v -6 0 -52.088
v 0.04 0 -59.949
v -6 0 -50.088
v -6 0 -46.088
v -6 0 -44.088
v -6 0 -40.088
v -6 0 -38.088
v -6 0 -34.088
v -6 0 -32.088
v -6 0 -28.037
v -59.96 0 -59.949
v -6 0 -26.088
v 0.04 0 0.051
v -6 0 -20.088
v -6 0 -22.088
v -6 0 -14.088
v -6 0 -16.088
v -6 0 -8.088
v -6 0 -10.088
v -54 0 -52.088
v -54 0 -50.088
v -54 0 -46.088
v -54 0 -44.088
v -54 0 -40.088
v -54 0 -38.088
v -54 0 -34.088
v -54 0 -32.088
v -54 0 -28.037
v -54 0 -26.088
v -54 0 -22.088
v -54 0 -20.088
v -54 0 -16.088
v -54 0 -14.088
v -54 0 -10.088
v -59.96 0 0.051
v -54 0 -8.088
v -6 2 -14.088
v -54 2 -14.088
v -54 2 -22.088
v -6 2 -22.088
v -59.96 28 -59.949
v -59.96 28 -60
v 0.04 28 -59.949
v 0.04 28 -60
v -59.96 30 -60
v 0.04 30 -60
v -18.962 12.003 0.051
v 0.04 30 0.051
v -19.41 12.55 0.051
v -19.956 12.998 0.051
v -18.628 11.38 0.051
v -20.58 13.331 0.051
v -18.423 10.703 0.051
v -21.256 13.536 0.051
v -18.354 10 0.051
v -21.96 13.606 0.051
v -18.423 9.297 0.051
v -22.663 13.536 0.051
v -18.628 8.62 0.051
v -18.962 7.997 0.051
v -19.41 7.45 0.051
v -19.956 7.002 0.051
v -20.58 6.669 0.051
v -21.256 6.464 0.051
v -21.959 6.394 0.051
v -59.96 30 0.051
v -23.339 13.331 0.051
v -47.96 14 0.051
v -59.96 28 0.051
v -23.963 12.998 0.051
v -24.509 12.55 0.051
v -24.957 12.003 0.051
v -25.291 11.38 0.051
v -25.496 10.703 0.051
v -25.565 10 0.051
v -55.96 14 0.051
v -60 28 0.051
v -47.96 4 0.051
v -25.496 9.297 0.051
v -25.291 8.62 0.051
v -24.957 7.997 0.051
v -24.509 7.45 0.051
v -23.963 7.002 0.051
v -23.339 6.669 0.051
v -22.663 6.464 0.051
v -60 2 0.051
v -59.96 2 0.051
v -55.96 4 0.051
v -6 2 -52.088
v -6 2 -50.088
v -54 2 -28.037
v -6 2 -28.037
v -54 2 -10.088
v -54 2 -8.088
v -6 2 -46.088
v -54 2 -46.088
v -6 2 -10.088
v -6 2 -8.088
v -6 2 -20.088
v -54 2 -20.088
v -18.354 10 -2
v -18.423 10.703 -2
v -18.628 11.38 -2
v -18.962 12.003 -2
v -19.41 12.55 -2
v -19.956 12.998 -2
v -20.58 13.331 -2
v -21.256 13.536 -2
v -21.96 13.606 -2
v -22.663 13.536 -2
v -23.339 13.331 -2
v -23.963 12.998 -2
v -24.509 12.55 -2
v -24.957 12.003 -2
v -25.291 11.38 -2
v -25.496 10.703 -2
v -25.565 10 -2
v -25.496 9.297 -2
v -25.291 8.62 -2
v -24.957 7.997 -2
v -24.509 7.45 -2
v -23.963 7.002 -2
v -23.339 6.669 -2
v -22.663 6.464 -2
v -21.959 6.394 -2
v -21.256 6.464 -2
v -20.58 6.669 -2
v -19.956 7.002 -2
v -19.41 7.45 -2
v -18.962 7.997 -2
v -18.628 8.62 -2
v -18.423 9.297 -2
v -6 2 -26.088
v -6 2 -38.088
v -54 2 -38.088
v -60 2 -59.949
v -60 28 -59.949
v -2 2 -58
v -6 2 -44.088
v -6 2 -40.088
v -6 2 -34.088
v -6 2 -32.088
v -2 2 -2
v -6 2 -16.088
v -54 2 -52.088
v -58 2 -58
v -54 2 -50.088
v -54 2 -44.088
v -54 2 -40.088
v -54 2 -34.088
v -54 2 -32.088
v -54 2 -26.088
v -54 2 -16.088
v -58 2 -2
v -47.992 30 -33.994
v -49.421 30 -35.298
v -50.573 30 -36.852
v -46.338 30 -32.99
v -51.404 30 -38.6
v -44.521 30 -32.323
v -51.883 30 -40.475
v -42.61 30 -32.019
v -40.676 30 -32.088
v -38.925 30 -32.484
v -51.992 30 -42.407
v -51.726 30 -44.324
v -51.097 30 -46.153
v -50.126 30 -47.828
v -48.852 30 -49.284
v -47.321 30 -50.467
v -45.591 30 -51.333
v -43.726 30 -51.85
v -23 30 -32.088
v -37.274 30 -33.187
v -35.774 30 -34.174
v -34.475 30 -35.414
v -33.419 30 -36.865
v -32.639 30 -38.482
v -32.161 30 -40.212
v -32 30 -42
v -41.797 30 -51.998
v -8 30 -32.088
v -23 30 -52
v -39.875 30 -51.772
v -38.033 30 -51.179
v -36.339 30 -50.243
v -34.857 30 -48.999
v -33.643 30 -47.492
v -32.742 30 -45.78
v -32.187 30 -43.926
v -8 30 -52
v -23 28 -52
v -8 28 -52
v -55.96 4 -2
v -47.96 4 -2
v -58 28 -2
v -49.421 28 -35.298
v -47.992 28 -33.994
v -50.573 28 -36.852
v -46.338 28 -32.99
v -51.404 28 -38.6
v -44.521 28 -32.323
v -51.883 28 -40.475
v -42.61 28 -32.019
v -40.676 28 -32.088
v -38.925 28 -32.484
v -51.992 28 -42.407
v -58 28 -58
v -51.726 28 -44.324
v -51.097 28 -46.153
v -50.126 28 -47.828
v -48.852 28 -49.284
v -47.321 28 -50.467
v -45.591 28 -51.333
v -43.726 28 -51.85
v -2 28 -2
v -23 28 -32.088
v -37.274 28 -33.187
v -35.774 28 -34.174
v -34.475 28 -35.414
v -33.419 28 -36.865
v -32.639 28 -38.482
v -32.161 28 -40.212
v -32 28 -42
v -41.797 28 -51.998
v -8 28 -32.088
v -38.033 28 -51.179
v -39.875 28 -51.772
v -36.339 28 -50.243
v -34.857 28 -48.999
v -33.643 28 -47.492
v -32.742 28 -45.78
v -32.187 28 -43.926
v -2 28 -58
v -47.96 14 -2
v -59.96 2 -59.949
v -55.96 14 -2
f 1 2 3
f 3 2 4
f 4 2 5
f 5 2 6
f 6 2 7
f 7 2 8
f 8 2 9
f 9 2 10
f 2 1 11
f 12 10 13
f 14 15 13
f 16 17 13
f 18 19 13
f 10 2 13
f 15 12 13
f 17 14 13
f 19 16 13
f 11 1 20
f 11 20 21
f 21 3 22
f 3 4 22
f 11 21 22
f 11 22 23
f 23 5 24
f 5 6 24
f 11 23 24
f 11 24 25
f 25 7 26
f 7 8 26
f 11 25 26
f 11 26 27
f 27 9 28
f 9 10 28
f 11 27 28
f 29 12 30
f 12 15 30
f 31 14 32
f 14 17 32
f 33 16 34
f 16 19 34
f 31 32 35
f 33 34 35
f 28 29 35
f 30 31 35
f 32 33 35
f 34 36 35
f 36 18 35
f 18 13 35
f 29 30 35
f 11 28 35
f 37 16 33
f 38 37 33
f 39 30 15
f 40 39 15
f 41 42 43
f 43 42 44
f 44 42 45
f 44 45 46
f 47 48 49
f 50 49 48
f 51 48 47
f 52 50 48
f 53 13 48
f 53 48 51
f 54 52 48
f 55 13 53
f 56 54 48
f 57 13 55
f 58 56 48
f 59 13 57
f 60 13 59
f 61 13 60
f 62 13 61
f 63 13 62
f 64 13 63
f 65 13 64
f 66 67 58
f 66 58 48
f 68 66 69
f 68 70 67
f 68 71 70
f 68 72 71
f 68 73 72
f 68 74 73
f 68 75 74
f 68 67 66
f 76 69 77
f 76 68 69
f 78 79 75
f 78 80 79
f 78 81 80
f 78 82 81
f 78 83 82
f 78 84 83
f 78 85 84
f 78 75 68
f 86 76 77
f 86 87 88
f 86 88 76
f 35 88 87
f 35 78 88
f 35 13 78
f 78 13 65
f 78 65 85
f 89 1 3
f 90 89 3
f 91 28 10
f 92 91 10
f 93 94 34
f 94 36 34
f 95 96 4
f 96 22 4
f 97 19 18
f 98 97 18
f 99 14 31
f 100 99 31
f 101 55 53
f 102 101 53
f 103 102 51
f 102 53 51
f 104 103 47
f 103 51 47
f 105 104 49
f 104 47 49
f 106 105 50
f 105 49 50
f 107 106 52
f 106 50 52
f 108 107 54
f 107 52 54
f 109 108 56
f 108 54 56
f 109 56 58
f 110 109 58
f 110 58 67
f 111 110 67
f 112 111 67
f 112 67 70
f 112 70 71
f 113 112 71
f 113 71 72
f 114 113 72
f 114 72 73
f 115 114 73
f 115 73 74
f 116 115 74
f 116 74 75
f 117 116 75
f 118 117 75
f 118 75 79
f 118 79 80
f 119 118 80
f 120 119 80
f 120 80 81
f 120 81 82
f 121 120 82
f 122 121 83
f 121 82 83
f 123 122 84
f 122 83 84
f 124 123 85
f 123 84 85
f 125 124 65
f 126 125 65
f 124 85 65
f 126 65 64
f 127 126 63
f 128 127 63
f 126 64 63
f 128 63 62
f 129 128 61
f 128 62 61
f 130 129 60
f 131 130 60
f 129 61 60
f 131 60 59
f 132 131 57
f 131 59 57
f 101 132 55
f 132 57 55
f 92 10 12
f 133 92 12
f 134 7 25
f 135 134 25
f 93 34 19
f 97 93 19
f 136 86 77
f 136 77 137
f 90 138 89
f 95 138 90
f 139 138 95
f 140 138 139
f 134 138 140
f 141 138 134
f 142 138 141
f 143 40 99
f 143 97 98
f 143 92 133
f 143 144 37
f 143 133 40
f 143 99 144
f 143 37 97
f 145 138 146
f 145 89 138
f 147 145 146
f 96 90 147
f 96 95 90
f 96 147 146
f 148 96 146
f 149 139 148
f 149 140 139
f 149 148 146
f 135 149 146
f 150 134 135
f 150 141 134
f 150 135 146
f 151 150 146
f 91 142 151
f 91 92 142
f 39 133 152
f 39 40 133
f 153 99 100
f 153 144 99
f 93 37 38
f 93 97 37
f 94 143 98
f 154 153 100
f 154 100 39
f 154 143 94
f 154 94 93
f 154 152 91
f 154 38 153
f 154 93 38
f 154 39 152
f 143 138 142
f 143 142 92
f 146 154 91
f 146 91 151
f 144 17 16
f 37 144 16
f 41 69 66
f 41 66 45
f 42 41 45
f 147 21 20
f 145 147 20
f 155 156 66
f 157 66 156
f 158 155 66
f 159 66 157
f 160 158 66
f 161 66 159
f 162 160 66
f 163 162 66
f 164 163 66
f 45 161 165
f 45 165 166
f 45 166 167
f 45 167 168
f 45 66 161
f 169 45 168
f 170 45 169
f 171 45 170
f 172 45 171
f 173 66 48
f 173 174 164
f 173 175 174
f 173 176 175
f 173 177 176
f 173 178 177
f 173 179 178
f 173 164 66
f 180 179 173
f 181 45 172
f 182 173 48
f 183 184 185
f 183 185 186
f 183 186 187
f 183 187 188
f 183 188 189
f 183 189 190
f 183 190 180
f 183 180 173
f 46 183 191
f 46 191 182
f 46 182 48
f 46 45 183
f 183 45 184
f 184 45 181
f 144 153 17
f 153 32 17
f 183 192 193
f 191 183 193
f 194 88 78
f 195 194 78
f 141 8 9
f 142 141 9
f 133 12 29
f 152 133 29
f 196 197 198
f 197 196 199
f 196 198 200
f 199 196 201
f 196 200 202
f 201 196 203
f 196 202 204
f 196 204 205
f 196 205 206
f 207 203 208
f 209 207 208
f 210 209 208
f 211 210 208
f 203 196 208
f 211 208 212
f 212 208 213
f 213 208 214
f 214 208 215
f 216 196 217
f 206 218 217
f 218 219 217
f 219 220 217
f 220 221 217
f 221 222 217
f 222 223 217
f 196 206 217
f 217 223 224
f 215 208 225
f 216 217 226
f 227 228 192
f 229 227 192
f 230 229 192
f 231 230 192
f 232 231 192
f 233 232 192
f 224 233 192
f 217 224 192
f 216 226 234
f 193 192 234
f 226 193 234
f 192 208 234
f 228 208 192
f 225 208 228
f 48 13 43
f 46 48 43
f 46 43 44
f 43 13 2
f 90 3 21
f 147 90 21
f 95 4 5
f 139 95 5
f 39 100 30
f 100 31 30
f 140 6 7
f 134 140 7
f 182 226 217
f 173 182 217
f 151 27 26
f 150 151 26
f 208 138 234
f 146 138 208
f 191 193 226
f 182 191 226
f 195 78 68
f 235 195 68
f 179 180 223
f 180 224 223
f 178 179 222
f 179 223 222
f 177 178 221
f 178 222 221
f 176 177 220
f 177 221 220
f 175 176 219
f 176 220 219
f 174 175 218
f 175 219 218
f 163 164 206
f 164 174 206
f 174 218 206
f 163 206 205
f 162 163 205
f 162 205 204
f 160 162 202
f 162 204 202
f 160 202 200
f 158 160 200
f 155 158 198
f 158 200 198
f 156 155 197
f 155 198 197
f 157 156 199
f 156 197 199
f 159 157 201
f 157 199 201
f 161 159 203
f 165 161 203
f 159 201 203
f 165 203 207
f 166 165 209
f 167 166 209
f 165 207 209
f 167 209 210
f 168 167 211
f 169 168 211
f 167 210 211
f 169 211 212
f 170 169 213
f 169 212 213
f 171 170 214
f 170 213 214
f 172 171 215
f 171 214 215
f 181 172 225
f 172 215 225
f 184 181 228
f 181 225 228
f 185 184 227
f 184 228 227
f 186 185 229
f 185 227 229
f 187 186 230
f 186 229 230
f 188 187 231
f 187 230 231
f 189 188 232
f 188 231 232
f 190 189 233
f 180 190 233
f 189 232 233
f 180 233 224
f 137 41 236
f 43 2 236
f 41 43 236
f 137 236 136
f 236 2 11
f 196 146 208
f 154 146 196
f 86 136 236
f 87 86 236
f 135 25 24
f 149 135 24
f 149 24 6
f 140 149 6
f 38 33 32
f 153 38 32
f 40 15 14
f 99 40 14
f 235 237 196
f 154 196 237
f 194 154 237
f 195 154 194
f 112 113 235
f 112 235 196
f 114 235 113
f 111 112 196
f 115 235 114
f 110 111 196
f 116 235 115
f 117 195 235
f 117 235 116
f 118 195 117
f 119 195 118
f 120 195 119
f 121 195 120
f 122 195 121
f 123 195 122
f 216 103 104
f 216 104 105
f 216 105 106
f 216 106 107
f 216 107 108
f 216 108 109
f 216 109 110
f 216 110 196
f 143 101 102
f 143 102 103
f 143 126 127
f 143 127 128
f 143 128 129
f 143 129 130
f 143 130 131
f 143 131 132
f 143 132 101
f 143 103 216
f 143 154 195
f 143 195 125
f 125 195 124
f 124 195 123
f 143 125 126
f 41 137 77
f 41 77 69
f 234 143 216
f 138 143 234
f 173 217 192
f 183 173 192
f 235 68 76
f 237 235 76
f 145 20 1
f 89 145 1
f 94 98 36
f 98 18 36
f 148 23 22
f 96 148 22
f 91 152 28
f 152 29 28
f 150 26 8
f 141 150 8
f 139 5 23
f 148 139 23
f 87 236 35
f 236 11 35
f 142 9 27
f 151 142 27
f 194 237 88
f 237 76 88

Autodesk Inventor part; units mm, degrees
ref_plane "YZ Plane" through (0, 0, 0) normal (1, 0, 0) x (0, 1, 0)
ref_plane "XZ Plane" through (0, 0, 0) normal (0, 1, 0) x (-1, 0, 0)
ref_plane "XY Plane" through (0, 0, 0) normal (0, 0, 1) x (1, 0, 0)
sketch "Sketch1" plane through (0, 0, 0) normal (0, 1, 0) x (-1, 0, 0)
  line L0 (59.9595, 0.0507) -> (-0.0405, 0.0507)
  line L1 (-0.0405, 0.0507) -> (-0.0405, -59.9493)
  line L2 (-0.0405, -59.9493) -> (59.9595, -59.9493)
  line L3 (59.9595, -59.9493) -> (59.9595, 0.0507)
  line L4 (54, -52.088) -> (6, -52.088)
  line L5 (6, -52.088) -> (6, -50.088)
  line L6 (6, -50.088) -> (54, -50.088)
  line L7 (54, -50.088) -> (54, -52.088)
  line L8 (54, -46.088) -> (6, -46.088)
  line L9 (6, -46.088) -> (6, -44.088)
  line L10 (6, -44.088) -> (54, -44.088)
  line L11 (54, -44.088) -> (54, -46.088)
  line L12 (54, -40.088) -> (6, -40.088)
  line L13 (6, -40.088) -> (6, -38.088)
  line L14 (6, -38.088) -> (54, -38.088)
  line L15 (54, -38.088) -> (54, -40.088)
  line L16 (54, -34.088) -> (6, -34.088)
  line L17 (6, -34.088) -> (6, -32.088)
  line L18 (6, -32.088) -> (54, -32.088)
  line L19 (54, -32.088) -> (54, -34.088)
  line L20 (54, -28.0372) -> (6, -28.0372)
  line L21 (6, -28.0372) -> (6, -26.088)
  line L22 (6, -26.088) -> (54, -26.088)
  line L23 (54, -26.088) -> (54, -28.0372)
  line L24 (54, -22.088) -> (6, -22.088)
  line L25 (6, -22.088) -> (6, -20.088)
  line L26 (6, -20.088) -> (54, -20.088)
  line L27 (54, -20.088) -> (54, -22.088)
  line L28 (54, -16.088) -> (6, -16.088)
  line L29 (6, -16.088) -> (6, -14.088)
  line L30 (6, -14.088) -> (54, -14.088)
  line L31 (54, -14.088) -> (54, -16.088)
  line L32 (54, -10.088) -> (6, -10.088)
  line L33 (6, -10.088) -> (6, -8.088)
  line L34 (6, -8.088) -> (54, -8.088)
  line L35 (54, -8.088) -> (54, -10.088)
  line L36 (2, -58) -> (58, -58)
  line L37 (58, -58) -> (58, -2)
  line L38 (58, -2) -> (2, -2)
  line L39 (2, -2) -> (2, -58)
  point P0 (0, 0)
  dimension "d0" = 60
  dimension "d1" = 60
extrude "Bottom" add sketch "Sketch1" along normal blind 2 contours L3 L2 L1 L0 | L39 L38 L37 L36
sketch "Sketch2" plane through (0, 2, 0) normal (0, 1, 0) x (1, 0, 0)
  line L0 (-59.9595, -0.0507) -> (0.0405, -0.0507) projected
  line L1 (-60, 59.9493) -> (-58, 59.9493)
  line L2 (-58, 59.9493) -> (-58, -0.0507)
  line L3 (-58, -0.0507) -> (-60, -0.0507)
  line L4 (-60, -0.0507) -> (-60, 59.9493)
  line L5 (0.0405, 59.9493) -> (-59.9595, 59.9493) projected
  line L6 (-2, 59.9493) -> (0.0405, 59.9493)
  line L7 (0.0405, 59.9493) -> (0.0405, -0.0507)
  line L8 (0.0405, -0.0507) -> (-2, -0.0507)
  line L9 (-2, -0.0507) -> (-2, 59.9493)
  line L10 (-58, 59.9493) -> (-2, 59.9493)
  line L11 (-2, 59.9493) -> (-2, 58)
  line L12 (-2, 58) -> (-58, 58)
  line L13 (-58, 58) -> (-58, 59.9493)
  line L14 (-58, 2) -> (-2, 2)
  line L15 (-2, 2) -> (-2, -0.0507)
  line L16 (-2, -0.0507) -> (-58, -0.0507)
  line L17 (-58, -0.0507) -> (-58, 2)
  point P0 (-2, 2)
extrude "Walls" add sketch "Sketch2" along normal blind 26 contours L3 L4 L1 L2 L0 | L2 L14 L9 L0 | L9 L5 L7 L0 | L2 L5 L9 L12
sketch "Sketch3" plane through (-59.9595, 0, 0.0507) normal (0, 0, 1) x (1, 0, 0)
  line L0 (4, 4) -> (12, 4)
  line L1 (12, 4) -> (12, 14)
  line L2 (12, 14) -> (4, 14)
  line L3 (4, 14) -> (4, 4)
  line L4 (5.6179, 18.3587) -> (10.1248, 18.3587) construction
  line L5 (10.1248, 18.3587) -> (10.1248, 14.1529) construction
  line L6 (10.1248, 14.1529) -> (5.6179, 14.1529) construction
  line L7 (5.6179, 14.1529) -> (5.6179, 18.3587) construction
  circle A0 centre (38, 10) radius 3.6056
  line L8 (32.7887, 17.939) -> (43.0738, 17.939) construction
  line L9 (43.0738, 17.939) -> (43.0738, 14.8367) construction
  line L10 (43.0738, 14.8367) -> (32.7887, 14.8367) construction
  line L11 (32.7887, 14.8367) -> (32.7887, 17.939) construction
  point P0 (59.9595, 0)
extrude "AC/Reset" cut sketch "Sketch3" against normal blind 10
sketch "Sketch4" plane through (0, 28, 0) normal (0, 1, 0) x (1, 0, 0)
  line L0 (0.0405, -0.0507) -> (0.0405, 59.9493) projected
  line L1 (-59.9595, 60) -> (0.0405, 60)
  line L2 (0.0405, 60) -> (0.0405, -0.0507)
  line L3 (0.0405, -0.0507) -> (-59.9595, -0.0507)
  line L4 (-59.9595, -0.0507) -> (-59.9595, 60)
  circle A0 centre (-42, 42) radius 10
  line L5 (-6, 32.088) -> (-54, 32.088) projected
  line L6 (-23, 52) -> (-8, 52)
  line L7 (-8, 52) -> (-8, 32.088)
  line L8 (-8, 32.088) -> (-23, 32.088)
  line L9 (-23, 32.088) -> (-23, 52)
  point P0 (0, 0)
  dimension "d8" = 20
  dimension "d9" = 60
extrude "Extrusion4" add sketch "Sketch4" along normal blind 2
